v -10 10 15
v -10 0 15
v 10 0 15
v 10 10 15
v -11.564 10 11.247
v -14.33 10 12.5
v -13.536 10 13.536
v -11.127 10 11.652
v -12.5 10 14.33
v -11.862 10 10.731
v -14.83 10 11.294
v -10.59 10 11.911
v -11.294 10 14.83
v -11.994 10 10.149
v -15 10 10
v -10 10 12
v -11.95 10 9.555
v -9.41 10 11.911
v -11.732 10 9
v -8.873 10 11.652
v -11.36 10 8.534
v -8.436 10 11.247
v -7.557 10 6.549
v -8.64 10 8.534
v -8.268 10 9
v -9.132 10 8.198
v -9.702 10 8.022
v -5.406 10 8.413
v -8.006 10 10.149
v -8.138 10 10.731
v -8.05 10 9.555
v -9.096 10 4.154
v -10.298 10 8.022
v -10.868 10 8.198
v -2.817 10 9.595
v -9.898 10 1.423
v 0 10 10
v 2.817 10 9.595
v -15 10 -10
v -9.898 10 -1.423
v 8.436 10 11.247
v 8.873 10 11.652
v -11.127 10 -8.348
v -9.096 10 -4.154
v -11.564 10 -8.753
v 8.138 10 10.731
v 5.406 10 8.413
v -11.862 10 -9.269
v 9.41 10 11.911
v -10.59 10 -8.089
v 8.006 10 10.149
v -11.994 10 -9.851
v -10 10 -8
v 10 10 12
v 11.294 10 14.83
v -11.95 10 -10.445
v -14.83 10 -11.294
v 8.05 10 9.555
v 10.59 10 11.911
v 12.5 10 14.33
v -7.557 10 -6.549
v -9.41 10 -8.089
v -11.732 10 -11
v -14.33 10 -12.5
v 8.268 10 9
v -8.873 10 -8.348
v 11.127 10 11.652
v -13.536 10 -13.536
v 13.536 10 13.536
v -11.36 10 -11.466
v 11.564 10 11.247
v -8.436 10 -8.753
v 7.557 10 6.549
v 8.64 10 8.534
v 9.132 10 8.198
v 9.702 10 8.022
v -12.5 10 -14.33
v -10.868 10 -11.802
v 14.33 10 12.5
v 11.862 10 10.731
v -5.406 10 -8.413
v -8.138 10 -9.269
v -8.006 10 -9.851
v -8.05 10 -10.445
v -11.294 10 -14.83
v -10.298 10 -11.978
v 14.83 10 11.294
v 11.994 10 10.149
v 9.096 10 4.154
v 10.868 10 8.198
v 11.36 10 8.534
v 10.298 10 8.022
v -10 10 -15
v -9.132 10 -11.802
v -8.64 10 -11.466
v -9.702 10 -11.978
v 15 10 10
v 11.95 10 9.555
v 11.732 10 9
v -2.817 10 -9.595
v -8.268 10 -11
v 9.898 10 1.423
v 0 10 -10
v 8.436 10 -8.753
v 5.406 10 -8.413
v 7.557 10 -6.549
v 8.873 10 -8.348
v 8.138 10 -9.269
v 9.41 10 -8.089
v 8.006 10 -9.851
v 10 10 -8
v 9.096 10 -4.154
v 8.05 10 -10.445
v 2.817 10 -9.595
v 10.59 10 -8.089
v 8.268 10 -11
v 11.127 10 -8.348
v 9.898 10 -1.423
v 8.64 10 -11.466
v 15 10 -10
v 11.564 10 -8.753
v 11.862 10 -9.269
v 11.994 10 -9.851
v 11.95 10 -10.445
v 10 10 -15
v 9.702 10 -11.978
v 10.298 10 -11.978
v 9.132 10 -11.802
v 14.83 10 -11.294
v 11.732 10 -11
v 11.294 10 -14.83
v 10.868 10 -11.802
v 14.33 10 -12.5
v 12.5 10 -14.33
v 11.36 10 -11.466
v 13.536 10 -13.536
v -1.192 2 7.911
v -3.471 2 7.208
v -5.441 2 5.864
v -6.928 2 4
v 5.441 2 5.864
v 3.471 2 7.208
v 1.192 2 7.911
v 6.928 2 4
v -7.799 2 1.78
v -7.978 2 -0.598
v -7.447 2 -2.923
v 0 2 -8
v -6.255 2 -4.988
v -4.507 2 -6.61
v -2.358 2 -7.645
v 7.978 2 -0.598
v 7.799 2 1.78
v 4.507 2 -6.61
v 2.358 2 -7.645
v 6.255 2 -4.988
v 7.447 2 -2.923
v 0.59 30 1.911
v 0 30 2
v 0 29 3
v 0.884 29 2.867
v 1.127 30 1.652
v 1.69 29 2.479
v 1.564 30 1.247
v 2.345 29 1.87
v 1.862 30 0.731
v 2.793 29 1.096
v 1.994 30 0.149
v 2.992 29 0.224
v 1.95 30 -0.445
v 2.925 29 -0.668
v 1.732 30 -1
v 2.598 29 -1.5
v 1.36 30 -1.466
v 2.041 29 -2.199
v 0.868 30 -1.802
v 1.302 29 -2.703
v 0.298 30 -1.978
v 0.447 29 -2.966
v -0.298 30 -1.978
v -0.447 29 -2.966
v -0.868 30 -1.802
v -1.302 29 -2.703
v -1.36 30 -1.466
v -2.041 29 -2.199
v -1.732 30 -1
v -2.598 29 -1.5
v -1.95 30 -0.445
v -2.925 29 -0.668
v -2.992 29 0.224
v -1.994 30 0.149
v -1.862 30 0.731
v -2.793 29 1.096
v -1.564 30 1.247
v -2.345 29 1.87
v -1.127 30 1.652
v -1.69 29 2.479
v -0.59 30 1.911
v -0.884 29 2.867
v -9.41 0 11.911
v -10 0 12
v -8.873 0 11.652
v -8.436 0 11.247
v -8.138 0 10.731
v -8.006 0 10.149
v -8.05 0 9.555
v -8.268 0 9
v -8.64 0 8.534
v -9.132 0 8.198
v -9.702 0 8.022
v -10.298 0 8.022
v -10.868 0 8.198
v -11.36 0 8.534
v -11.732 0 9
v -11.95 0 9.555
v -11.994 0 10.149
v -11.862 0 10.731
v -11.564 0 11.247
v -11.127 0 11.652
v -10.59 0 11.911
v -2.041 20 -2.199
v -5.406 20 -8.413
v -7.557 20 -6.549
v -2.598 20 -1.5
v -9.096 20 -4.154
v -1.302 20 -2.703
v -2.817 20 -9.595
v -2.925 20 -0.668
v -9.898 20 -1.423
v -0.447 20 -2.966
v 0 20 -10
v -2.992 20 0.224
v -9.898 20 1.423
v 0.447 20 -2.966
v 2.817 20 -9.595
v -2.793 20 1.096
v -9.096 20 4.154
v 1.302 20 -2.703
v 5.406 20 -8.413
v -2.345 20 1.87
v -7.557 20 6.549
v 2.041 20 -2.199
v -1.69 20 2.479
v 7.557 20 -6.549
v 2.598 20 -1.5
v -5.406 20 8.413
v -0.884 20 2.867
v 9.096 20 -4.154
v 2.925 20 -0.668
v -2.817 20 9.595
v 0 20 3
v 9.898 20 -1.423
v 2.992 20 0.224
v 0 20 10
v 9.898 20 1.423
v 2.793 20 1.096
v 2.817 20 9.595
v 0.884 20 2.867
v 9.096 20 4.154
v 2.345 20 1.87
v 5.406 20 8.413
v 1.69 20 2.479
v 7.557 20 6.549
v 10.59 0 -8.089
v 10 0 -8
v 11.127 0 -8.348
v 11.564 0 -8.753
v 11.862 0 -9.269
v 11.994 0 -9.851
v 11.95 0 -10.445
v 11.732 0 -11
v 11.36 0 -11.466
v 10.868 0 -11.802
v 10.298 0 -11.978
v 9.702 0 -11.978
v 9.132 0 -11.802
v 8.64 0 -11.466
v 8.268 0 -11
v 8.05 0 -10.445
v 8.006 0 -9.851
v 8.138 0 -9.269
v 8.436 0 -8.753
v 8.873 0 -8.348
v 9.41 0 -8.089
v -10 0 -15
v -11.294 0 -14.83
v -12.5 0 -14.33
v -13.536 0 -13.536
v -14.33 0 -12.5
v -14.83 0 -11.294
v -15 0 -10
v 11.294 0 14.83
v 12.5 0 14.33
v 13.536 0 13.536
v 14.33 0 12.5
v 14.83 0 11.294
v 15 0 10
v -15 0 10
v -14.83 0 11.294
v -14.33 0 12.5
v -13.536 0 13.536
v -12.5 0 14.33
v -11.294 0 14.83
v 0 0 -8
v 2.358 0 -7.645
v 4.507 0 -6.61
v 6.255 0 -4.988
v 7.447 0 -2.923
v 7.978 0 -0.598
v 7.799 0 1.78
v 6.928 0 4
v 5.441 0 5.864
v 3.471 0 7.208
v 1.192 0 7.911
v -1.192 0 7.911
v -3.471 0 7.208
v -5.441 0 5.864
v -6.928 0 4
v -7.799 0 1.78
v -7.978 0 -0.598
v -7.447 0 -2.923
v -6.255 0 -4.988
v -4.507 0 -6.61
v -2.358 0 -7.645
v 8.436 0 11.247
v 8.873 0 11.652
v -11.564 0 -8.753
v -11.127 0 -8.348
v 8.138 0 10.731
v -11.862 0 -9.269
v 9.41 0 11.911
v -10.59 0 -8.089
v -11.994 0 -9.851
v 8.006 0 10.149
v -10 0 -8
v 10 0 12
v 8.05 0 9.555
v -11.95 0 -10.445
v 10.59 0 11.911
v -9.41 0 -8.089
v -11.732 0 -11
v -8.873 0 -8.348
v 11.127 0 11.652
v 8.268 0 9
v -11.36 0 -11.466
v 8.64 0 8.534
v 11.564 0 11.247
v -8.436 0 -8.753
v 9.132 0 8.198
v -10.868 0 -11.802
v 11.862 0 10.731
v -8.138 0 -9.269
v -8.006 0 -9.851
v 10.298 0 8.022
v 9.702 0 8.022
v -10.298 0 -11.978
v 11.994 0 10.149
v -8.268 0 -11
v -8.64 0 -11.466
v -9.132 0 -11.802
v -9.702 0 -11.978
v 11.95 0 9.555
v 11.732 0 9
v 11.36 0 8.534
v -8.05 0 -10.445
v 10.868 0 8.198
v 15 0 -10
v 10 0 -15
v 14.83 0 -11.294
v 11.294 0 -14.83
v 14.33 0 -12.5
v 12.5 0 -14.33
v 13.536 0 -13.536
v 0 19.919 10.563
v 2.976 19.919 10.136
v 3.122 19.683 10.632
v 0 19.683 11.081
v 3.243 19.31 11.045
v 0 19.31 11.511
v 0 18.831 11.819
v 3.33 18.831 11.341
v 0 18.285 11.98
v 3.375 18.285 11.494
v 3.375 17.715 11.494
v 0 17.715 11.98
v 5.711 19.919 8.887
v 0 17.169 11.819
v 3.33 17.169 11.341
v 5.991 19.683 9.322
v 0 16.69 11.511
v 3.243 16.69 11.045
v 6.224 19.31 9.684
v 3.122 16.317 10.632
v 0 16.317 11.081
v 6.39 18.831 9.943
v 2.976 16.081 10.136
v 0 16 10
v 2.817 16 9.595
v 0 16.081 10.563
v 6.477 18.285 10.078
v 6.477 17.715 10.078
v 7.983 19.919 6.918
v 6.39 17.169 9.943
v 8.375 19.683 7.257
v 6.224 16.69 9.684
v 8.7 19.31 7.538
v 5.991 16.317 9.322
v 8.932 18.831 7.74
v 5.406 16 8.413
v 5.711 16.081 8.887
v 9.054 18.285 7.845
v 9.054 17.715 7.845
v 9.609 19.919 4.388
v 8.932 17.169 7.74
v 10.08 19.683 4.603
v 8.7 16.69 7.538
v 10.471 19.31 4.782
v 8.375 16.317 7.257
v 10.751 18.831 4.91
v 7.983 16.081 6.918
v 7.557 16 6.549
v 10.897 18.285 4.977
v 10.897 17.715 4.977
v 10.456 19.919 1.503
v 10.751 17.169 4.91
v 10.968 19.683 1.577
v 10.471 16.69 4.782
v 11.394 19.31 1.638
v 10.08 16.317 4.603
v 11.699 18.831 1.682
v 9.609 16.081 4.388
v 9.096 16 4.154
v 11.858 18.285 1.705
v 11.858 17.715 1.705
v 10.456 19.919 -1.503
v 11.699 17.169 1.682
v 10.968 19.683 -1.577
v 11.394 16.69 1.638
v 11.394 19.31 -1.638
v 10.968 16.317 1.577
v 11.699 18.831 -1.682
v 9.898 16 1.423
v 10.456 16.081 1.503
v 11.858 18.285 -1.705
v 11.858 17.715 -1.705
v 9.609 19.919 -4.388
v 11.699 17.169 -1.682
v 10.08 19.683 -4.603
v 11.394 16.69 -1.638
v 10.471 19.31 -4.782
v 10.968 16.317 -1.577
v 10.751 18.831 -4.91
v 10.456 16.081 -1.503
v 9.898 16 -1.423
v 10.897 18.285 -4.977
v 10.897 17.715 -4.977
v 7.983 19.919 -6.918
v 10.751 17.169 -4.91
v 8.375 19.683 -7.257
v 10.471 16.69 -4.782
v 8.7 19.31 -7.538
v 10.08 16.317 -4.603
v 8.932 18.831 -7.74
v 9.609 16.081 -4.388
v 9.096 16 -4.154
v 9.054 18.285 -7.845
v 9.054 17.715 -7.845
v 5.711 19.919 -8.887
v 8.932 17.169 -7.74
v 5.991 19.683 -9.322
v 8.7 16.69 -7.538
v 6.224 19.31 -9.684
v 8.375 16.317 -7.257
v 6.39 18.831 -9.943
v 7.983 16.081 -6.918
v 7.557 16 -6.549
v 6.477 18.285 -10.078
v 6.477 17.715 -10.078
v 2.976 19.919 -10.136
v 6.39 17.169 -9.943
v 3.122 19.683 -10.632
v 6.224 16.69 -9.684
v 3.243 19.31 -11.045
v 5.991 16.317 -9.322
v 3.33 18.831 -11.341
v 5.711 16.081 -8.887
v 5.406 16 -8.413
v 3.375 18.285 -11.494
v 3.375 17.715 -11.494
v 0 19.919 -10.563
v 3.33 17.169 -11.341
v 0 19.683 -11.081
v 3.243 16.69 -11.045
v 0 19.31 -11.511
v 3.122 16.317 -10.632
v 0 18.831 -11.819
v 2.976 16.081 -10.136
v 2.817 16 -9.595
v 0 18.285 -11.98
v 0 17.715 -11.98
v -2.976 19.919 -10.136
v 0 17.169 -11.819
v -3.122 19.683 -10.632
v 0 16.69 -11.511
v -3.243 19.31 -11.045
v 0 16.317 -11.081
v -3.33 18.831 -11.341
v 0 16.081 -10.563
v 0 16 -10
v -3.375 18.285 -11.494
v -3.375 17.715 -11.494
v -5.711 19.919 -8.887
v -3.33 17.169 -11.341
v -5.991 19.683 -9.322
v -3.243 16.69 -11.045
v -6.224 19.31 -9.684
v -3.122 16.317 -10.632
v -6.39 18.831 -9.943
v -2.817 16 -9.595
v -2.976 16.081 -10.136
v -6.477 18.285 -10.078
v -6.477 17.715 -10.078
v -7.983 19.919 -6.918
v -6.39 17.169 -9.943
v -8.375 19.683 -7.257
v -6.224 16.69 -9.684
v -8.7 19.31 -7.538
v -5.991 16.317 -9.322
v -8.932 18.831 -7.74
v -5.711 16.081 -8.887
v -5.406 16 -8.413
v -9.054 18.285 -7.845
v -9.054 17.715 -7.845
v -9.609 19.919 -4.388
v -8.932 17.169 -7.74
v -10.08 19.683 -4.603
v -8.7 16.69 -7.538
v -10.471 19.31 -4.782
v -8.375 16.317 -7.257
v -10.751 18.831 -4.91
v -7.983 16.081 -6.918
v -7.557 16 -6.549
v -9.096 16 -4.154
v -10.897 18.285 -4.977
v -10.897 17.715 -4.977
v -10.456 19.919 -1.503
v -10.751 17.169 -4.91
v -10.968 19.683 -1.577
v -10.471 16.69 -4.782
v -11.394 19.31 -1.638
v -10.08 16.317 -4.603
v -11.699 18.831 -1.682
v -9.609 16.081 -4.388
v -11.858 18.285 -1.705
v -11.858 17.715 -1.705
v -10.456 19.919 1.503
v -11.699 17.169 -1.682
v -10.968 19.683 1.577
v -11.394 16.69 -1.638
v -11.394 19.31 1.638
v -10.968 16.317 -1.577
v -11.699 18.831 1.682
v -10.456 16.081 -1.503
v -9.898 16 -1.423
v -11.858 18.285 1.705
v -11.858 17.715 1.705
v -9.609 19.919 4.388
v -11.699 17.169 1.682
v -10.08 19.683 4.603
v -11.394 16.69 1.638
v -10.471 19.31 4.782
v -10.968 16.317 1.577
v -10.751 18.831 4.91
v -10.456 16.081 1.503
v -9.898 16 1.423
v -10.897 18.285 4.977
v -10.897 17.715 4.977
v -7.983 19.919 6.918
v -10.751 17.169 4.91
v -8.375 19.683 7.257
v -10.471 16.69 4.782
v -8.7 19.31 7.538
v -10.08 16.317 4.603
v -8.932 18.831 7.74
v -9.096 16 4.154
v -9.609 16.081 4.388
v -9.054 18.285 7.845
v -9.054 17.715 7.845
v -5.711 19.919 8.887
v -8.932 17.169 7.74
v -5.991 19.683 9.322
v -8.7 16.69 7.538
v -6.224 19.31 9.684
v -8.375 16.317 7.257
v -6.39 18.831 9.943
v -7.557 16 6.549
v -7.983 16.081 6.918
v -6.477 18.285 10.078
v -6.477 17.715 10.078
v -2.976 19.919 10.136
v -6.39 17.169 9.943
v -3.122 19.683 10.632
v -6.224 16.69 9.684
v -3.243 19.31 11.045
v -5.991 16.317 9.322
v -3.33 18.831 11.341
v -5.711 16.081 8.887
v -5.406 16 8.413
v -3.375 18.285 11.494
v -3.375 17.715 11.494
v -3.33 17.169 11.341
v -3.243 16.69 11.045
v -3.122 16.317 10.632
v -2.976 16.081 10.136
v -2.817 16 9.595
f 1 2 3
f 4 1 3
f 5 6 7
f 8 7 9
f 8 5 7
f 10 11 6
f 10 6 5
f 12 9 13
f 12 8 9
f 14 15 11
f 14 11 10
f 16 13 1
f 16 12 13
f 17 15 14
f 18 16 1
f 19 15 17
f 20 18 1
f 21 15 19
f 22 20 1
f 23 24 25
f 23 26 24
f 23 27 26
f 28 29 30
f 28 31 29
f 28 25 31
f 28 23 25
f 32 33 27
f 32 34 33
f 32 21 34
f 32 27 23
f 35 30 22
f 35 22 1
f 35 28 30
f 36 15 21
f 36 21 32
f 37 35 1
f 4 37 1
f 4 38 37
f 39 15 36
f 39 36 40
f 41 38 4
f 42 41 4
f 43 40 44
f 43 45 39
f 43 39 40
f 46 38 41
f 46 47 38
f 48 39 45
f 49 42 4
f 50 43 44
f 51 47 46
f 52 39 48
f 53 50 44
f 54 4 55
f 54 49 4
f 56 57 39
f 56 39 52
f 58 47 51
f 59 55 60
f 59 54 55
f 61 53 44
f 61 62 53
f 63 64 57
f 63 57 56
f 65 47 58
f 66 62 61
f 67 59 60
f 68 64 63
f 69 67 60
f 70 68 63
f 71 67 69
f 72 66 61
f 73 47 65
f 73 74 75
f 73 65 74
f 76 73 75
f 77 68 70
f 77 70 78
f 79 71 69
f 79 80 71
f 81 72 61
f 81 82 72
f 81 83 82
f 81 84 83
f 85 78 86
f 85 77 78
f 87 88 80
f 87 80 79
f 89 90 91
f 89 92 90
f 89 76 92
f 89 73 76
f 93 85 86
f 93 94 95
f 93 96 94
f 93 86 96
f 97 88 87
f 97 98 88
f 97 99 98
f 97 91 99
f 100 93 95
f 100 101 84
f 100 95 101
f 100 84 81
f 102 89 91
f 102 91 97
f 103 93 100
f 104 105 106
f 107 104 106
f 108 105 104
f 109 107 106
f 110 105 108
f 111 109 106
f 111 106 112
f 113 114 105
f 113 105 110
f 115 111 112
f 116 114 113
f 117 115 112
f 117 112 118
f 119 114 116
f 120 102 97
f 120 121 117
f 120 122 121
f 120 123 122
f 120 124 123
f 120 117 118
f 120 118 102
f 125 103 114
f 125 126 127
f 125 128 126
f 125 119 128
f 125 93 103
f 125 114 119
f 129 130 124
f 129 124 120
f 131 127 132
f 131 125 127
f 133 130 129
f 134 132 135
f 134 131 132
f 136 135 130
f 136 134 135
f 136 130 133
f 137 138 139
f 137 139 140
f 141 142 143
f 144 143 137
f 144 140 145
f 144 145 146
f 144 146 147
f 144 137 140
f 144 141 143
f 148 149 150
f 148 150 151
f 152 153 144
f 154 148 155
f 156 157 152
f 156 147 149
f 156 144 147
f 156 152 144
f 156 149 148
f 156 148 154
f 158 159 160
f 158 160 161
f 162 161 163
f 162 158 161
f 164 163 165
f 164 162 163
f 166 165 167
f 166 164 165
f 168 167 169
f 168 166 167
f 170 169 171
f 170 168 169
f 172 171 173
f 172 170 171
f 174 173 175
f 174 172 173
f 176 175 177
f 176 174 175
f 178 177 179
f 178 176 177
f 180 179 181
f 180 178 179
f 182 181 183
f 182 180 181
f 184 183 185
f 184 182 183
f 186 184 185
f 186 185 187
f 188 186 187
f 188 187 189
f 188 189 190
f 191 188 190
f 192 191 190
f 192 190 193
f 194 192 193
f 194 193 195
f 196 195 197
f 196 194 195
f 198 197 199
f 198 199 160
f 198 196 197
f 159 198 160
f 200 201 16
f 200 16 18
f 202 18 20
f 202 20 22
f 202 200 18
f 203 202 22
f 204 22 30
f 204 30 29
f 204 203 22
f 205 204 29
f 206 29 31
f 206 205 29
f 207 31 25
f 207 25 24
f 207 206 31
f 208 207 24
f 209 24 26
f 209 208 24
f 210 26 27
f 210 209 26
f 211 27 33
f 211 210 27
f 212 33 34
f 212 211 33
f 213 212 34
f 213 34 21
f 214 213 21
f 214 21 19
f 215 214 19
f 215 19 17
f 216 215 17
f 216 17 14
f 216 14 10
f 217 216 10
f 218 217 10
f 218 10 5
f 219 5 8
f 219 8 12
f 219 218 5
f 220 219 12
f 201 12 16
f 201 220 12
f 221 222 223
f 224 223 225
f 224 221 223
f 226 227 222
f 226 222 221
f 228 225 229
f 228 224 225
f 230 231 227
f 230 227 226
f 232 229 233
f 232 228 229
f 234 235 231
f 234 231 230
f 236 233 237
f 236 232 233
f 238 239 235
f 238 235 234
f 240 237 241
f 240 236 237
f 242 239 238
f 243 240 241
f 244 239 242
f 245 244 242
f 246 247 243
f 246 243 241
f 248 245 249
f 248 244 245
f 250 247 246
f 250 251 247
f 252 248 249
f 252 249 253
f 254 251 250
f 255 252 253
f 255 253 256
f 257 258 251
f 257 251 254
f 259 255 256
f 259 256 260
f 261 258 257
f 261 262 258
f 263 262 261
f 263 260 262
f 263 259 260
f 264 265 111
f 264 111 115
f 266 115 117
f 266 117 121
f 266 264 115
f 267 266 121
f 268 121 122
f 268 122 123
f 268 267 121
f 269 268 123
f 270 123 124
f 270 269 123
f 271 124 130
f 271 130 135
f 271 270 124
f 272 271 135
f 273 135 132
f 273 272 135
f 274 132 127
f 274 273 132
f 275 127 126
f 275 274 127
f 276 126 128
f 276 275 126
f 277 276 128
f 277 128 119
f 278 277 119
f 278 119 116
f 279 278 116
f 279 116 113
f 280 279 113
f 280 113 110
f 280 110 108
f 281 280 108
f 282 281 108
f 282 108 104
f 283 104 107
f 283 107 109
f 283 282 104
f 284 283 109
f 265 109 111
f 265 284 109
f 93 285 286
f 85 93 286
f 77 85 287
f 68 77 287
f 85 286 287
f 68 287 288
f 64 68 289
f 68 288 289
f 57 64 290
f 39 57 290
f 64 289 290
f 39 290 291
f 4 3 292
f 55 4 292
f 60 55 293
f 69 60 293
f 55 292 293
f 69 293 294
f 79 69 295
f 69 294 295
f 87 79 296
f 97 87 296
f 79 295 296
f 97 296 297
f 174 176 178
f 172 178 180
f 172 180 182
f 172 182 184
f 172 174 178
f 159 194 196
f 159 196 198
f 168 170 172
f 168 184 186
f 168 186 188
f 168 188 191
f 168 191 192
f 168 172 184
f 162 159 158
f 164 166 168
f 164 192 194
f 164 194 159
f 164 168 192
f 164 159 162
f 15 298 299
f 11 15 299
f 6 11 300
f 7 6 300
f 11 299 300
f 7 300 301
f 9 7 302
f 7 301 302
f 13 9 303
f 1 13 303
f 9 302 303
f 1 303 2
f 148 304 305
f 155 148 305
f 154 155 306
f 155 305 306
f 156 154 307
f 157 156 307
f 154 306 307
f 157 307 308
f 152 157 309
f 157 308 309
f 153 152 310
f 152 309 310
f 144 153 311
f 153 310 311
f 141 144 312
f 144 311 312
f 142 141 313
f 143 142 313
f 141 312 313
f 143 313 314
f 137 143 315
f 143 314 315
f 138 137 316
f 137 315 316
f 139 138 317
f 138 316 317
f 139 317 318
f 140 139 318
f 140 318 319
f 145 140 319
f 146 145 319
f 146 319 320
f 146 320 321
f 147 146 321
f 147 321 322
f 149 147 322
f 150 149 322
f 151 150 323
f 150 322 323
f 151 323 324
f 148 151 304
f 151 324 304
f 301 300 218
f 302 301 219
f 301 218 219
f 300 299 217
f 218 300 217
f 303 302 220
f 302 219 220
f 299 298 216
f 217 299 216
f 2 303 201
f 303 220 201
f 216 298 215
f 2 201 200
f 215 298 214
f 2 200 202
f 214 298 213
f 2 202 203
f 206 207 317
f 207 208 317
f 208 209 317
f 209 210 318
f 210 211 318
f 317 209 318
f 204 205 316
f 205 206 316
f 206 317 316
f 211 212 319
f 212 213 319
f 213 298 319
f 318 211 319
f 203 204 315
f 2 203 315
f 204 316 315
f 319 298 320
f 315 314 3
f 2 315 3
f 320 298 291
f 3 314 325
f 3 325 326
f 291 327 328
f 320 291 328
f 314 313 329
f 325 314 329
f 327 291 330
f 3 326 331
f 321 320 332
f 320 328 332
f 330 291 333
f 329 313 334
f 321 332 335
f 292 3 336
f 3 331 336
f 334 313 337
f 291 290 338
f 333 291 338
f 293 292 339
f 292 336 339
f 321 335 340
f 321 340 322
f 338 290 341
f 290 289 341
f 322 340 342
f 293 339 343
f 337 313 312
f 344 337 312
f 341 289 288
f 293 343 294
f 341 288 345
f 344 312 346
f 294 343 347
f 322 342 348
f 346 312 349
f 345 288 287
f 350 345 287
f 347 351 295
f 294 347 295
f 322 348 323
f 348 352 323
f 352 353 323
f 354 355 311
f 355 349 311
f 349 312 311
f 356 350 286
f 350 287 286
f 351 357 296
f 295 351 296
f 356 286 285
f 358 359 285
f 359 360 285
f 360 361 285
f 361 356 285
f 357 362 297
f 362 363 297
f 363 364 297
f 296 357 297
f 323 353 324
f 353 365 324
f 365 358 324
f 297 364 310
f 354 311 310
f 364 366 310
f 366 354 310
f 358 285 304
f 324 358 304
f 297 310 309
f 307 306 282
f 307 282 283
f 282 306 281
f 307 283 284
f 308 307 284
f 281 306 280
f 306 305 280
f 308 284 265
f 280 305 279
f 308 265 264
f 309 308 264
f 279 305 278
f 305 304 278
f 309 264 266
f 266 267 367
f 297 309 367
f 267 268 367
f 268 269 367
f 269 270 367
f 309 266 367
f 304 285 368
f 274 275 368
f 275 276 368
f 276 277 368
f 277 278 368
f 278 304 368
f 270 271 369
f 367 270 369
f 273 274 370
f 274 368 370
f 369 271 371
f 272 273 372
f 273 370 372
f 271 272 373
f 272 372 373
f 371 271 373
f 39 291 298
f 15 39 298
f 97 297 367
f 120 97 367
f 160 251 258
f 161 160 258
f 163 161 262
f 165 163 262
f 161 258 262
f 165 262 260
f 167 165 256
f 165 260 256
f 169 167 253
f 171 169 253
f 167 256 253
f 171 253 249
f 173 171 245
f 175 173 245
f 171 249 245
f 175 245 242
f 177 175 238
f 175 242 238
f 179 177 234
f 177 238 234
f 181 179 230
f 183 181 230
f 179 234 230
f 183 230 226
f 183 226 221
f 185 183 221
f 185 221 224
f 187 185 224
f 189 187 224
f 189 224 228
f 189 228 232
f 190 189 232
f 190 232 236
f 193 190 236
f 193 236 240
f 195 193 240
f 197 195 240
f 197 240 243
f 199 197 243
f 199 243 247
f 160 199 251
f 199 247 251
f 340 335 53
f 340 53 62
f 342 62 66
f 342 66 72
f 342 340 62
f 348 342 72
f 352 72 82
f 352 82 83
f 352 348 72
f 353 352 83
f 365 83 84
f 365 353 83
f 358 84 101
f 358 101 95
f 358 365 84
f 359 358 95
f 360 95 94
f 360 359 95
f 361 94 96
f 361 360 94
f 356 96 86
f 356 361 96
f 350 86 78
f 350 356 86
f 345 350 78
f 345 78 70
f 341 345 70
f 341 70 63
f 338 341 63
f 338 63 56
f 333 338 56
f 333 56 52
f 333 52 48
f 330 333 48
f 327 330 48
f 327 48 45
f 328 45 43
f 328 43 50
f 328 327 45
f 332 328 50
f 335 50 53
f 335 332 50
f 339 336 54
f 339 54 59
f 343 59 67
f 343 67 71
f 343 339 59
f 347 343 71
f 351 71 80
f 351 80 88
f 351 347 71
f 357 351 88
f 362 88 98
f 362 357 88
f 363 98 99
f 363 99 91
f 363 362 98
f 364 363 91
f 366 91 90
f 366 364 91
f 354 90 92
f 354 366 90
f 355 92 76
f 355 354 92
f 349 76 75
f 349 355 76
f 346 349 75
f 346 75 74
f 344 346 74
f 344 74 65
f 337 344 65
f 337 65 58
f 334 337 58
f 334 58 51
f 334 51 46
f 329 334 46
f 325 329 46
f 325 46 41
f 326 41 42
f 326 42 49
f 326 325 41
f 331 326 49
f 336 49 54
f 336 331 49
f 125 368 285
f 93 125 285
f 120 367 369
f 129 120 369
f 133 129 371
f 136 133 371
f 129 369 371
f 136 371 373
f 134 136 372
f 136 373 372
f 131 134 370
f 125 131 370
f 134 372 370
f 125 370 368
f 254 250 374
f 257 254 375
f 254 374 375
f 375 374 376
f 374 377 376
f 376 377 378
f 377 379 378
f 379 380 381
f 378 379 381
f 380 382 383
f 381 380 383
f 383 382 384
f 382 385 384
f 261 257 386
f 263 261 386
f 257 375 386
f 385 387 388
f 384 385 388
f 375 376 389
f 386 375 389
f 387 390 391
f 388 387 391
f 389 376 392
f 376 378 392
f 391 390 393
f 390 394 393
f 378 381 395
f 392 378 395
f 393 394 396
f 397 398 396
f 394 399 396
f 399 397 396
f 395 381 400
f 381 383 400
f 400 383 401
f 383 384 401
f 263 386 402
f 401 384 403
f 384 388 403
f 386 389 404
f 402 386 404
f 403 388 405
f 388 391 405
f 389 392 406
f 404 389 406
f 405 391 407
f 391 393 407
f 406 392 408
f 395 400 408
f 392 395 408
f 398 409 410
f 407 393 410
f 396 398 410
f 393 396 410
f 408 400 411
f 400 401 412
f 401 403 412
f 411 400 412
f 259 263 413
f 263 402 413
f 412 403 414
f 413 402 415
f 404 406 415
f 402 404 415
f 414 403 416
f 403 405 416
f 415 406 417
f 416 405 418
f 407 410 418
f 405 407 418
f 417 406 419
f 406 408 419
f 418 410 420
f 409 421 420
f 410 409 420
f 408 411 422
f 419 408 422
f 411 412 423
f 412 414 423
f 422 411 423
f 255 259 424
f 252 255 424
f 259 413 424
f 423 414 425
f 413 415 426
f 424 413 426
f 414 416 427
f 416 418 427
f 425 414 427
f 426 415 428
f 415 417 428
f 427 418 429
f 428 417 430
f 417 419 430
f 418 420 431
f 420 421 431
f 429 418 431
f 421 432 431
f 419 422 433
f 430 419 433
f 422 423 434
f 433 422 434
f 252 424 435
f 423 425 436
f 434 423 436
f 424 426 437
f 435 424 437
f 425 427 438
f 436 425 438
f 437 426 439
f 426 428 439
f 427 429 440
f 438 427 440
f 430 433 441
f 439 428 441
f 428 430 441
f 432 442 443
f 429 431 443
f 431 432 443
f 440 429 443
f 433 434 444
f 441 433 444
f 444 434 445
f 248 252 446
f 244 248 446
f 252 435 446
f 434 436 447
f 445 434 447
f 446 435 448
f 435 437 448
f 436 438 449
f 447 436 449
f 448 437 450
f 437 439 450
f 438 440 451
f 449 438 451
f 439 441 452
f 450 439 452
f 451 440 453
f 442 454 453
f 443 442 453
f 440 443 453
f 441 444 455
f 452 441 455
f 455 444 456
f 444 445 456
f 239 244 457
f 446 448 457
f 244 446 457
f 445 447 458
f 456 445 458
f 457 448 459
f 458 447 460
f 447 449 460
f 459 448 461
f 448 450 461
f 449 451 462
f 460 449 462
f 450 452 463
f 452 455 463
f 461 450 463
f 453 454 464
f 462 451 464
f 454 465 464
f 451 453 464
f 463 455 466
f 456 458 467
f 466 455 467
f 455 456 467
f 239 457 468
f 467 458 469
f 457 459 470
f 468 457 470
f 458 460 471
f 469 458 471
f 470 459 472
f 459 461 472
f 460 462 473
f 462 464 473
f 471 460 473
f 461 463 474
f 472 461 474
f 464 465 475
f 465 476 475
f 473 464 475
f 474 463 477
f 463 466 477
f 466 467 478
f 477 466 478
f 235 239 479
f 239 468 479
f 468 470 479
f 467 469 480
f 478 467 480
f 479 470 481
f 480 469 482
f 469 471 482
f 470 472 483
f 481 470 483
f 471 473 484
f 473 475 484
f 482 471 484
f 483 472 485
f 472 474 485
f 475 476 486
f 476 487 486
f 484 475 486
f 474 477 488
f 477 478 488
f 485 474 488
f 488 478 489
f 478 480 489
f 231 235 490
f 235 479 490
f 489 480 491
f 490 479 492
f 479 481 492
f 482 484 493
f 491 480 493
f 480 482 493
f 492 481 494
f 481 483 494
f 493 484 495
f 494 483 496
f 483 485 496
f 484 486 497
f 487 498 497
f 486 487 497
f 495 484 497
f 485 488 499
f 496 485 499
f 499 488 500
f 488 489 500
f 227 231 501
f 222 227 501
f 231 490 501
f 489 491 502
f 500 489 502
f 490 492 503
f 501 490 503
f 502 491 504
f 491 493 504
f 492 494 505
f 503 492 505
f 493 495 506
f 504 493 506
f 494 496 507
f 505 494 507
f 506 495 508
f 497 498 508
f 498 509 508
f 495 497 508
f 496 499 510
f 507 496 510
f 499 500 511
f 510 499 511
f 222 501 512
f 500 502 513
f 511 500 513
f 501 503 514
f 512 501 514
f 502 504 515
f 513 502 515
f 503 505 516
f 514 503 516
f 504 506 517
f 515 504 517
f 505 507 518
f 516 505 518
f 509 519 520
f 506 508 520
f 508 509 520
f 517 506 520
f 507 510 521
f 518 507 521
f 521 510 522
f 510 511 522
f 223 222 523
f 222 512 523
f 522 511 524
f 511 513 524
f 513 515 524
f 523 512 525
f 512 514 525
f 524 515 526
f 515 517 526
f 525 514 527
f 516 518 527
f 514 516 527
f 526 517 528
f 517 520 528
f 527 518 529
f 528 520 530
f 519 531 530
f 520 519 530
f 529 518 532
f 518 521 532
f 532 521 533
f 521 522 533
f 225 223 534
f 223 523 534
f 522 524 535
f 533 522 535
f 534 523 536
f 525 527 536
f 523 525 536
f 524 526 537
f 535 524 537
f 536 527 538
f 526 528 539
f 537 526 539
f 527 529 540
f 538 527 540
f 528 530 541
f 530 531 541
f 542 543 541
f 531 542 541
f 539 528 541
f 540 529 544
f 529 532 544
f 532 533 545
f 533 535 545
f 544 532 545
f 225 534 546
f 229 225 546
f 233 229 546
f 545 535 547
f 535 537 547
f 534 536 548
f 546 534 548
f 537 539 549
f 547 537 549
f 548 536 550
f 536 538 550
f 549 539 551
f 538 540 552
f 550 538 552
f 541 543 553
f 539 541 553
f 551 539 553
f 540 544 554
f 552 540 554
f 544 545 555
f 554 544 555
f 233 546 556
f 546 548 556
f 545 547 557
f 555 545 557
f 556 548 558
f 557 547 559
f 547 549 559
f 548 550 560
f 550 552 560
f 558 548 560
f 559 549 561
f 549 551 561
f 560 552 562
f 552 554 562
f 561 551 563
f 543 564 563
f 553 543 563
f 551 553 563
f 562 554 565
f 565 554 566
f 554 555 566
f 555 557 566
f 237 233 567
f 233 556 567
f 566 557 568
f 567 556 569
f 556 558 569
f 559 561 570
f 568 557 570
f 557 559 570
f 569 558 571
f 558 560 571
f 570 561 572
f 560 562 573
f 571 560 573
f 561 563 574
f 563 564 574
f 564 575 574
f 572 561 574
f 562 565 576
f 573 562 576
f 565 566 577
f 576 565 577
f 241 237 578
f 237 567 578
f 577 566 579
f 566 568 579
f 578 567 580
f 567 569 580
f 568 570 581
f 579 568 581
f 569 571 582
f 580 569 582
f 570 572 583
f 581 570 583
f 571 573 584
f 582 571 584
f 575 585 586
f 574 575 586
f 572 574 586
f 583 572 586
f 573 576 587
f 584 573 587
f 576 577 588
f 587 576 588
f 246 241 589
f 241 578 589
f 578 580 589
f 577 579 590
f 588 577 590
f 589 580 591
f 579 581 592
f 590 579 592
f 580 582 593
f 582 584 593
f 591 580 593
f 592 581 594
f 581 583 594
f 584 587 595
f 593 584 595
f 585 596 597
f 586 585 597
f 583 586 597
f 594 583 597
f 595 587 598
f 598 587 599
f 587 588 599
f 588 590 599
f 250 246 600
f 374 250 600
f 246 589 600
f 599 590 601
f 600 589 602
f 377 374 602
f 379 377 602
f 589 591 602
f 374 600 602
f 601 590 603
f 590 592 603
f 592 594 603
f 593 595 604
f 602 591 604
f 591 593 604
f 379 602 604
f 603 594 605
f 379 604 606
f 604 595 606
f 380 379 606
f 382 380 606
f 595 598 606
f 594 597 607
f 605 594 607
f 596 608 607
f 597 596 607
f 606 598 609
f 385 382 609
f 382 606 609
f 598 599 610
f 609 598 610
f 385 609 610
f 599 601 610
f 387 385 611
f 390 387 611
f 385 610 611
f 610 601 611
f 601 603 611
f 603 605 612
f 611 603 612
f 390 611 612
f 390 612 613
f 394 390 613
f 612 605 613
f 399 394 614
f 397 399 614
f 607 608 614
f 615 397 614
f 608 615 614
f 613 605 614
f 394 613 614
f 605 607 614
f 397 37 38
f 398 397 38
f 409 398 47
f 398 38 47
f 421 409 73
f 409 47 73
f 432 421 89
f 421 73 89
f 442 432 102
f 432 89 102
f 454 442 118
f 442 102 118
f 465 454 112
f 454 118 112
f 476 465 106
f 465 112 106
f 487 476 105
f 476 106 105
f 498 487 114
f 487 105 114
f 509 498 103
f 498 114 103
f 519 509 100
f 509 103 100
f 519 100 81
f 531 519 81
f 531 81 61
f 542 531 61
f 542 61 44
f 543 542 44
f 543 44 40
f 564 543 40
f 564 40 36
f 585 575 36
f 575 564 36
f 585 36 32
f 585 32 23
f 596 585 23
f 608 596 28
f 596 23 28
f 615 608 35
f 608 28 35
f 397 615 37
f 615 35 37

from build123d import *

# Parameters (mm, degrees)
SKETCH1_R           = 2
BOSS_EXTRUDE1_DEPTH = 10
SKETCH2_R           = 10
BOSS_EXTRUDE2_DEPTH = 10
SKETCH3_R           = 2
SKETCH4_R           = 3
BOSS_EXTRUDE3_DEPTH = 10
CHAMFER1_SIZE       = 1
SKETCH5_R           = 8
CUT_EXTRUDE1_DEPTH  = 2


with BuildPart() as part:
    # Sketch1 → Boss-Extrude1 (new body)
    with BuildSketch(Plane(origin=(0, 0, 0), x_dir=(1, 0, 0), z_dir=(0, 1, 0))):
        with BuildLine():
            Line((-10, -15), (10, -15))
            ThreePointArc((10, -15), (13.535533906, -13.535533906), (15, -10))
            Line((15, -10), (15, 10))
            ThreePointArc((15, 10), (13.535533906, 13.535533906), (10, 15))
            Line((10, 15), (-10, 15))
            ThreePointArc((-10, 15), (-13.535533906, 13.535533906), (-15, 10))
            Line((-15, 10), (-15, -10))
            ThreePointArc((-15, -10), (-13.535533906, -13.535533906), (-10, -15))
        make_face()
        with Locations(Location((-10, 10, 0), (0, 0, 270))):
            Circle(SKETCH1_R, mode=Mode.SUBTRACT)
        with Locations(Location((10, 10, 0), (0, 0, 270))):
            Circle(SKETCH1_R, mode=Mode.SUBTRACT)
        with Locations(Location((-10, -10, 0), (0, 0, 270))):
            Circle(SKETCH1_R, mode=Mode.SUBTRACT)
        with Locations(Location((10, -10, 0), (0, 0, 270))):
            Circle(SKETCH1_R, mode=Mode.SUBTRACT)
    extrude(amount=BOSS_EXTRUDE1_DEPTH)

    # Sketch2 → Boss-Extrude2 (add)
    with BuildSketch(Plane(origin=(0, 10, 0), x_dir=(1, 0, 0), z_dir=(0, 1, 0))):
        with Locations(Location((0, 0, 0), (0, 0, 270))):
            Circle(SKETCH2_R)
    extrude(amount=BOSS_EXTRUDE2_DEPTH)

    # Sketch3 → Revolve1 (revolve)
    with BuildSketch(Plane(origin=(0, 0, 0), x_dir=(0, 0, -1), z_dir=(1, 0, 0))):
        with Locations((-10, 18)):
            Circle(SKETCH3_R)
    revolve(axis=Axis((0, 0, 0), (0, 1, 0)))

    # Sketch4 → Boss-Extrude3 (add)
    with BuildSketch(Plane(origin=(0, 20, 0), x_dir=(1, 0, 0), z_dir=(0, 1, 0))):
        with Locations(Location((0, 0, 0), (0, 0, 270))):
            Circle(SKETCH4_R)
    extrude(amount=BOSS_EXTRUDE3_DEPTH)

    # Chamfer1
    chamfer1_edges = [part.edges().sort_by_distance(p)[0] for p in [
        (0, 30, -3),
    ]]
    chamfer(chamfer1_edges, length=CHAMFER1_SIZE)

    # Sketch5 → Cut-Extrude1 (cut)
    with BuildSketch(Plane.XZ):
        with Locations(Location((0, 0, 0), (0, 0, 270))):
            Circle(SKETCH5_R)
    extrude(amount=-CUT_EXTRUDE1_DEPTH, mode=Mode.SUBTRACT)


solid = part.part
